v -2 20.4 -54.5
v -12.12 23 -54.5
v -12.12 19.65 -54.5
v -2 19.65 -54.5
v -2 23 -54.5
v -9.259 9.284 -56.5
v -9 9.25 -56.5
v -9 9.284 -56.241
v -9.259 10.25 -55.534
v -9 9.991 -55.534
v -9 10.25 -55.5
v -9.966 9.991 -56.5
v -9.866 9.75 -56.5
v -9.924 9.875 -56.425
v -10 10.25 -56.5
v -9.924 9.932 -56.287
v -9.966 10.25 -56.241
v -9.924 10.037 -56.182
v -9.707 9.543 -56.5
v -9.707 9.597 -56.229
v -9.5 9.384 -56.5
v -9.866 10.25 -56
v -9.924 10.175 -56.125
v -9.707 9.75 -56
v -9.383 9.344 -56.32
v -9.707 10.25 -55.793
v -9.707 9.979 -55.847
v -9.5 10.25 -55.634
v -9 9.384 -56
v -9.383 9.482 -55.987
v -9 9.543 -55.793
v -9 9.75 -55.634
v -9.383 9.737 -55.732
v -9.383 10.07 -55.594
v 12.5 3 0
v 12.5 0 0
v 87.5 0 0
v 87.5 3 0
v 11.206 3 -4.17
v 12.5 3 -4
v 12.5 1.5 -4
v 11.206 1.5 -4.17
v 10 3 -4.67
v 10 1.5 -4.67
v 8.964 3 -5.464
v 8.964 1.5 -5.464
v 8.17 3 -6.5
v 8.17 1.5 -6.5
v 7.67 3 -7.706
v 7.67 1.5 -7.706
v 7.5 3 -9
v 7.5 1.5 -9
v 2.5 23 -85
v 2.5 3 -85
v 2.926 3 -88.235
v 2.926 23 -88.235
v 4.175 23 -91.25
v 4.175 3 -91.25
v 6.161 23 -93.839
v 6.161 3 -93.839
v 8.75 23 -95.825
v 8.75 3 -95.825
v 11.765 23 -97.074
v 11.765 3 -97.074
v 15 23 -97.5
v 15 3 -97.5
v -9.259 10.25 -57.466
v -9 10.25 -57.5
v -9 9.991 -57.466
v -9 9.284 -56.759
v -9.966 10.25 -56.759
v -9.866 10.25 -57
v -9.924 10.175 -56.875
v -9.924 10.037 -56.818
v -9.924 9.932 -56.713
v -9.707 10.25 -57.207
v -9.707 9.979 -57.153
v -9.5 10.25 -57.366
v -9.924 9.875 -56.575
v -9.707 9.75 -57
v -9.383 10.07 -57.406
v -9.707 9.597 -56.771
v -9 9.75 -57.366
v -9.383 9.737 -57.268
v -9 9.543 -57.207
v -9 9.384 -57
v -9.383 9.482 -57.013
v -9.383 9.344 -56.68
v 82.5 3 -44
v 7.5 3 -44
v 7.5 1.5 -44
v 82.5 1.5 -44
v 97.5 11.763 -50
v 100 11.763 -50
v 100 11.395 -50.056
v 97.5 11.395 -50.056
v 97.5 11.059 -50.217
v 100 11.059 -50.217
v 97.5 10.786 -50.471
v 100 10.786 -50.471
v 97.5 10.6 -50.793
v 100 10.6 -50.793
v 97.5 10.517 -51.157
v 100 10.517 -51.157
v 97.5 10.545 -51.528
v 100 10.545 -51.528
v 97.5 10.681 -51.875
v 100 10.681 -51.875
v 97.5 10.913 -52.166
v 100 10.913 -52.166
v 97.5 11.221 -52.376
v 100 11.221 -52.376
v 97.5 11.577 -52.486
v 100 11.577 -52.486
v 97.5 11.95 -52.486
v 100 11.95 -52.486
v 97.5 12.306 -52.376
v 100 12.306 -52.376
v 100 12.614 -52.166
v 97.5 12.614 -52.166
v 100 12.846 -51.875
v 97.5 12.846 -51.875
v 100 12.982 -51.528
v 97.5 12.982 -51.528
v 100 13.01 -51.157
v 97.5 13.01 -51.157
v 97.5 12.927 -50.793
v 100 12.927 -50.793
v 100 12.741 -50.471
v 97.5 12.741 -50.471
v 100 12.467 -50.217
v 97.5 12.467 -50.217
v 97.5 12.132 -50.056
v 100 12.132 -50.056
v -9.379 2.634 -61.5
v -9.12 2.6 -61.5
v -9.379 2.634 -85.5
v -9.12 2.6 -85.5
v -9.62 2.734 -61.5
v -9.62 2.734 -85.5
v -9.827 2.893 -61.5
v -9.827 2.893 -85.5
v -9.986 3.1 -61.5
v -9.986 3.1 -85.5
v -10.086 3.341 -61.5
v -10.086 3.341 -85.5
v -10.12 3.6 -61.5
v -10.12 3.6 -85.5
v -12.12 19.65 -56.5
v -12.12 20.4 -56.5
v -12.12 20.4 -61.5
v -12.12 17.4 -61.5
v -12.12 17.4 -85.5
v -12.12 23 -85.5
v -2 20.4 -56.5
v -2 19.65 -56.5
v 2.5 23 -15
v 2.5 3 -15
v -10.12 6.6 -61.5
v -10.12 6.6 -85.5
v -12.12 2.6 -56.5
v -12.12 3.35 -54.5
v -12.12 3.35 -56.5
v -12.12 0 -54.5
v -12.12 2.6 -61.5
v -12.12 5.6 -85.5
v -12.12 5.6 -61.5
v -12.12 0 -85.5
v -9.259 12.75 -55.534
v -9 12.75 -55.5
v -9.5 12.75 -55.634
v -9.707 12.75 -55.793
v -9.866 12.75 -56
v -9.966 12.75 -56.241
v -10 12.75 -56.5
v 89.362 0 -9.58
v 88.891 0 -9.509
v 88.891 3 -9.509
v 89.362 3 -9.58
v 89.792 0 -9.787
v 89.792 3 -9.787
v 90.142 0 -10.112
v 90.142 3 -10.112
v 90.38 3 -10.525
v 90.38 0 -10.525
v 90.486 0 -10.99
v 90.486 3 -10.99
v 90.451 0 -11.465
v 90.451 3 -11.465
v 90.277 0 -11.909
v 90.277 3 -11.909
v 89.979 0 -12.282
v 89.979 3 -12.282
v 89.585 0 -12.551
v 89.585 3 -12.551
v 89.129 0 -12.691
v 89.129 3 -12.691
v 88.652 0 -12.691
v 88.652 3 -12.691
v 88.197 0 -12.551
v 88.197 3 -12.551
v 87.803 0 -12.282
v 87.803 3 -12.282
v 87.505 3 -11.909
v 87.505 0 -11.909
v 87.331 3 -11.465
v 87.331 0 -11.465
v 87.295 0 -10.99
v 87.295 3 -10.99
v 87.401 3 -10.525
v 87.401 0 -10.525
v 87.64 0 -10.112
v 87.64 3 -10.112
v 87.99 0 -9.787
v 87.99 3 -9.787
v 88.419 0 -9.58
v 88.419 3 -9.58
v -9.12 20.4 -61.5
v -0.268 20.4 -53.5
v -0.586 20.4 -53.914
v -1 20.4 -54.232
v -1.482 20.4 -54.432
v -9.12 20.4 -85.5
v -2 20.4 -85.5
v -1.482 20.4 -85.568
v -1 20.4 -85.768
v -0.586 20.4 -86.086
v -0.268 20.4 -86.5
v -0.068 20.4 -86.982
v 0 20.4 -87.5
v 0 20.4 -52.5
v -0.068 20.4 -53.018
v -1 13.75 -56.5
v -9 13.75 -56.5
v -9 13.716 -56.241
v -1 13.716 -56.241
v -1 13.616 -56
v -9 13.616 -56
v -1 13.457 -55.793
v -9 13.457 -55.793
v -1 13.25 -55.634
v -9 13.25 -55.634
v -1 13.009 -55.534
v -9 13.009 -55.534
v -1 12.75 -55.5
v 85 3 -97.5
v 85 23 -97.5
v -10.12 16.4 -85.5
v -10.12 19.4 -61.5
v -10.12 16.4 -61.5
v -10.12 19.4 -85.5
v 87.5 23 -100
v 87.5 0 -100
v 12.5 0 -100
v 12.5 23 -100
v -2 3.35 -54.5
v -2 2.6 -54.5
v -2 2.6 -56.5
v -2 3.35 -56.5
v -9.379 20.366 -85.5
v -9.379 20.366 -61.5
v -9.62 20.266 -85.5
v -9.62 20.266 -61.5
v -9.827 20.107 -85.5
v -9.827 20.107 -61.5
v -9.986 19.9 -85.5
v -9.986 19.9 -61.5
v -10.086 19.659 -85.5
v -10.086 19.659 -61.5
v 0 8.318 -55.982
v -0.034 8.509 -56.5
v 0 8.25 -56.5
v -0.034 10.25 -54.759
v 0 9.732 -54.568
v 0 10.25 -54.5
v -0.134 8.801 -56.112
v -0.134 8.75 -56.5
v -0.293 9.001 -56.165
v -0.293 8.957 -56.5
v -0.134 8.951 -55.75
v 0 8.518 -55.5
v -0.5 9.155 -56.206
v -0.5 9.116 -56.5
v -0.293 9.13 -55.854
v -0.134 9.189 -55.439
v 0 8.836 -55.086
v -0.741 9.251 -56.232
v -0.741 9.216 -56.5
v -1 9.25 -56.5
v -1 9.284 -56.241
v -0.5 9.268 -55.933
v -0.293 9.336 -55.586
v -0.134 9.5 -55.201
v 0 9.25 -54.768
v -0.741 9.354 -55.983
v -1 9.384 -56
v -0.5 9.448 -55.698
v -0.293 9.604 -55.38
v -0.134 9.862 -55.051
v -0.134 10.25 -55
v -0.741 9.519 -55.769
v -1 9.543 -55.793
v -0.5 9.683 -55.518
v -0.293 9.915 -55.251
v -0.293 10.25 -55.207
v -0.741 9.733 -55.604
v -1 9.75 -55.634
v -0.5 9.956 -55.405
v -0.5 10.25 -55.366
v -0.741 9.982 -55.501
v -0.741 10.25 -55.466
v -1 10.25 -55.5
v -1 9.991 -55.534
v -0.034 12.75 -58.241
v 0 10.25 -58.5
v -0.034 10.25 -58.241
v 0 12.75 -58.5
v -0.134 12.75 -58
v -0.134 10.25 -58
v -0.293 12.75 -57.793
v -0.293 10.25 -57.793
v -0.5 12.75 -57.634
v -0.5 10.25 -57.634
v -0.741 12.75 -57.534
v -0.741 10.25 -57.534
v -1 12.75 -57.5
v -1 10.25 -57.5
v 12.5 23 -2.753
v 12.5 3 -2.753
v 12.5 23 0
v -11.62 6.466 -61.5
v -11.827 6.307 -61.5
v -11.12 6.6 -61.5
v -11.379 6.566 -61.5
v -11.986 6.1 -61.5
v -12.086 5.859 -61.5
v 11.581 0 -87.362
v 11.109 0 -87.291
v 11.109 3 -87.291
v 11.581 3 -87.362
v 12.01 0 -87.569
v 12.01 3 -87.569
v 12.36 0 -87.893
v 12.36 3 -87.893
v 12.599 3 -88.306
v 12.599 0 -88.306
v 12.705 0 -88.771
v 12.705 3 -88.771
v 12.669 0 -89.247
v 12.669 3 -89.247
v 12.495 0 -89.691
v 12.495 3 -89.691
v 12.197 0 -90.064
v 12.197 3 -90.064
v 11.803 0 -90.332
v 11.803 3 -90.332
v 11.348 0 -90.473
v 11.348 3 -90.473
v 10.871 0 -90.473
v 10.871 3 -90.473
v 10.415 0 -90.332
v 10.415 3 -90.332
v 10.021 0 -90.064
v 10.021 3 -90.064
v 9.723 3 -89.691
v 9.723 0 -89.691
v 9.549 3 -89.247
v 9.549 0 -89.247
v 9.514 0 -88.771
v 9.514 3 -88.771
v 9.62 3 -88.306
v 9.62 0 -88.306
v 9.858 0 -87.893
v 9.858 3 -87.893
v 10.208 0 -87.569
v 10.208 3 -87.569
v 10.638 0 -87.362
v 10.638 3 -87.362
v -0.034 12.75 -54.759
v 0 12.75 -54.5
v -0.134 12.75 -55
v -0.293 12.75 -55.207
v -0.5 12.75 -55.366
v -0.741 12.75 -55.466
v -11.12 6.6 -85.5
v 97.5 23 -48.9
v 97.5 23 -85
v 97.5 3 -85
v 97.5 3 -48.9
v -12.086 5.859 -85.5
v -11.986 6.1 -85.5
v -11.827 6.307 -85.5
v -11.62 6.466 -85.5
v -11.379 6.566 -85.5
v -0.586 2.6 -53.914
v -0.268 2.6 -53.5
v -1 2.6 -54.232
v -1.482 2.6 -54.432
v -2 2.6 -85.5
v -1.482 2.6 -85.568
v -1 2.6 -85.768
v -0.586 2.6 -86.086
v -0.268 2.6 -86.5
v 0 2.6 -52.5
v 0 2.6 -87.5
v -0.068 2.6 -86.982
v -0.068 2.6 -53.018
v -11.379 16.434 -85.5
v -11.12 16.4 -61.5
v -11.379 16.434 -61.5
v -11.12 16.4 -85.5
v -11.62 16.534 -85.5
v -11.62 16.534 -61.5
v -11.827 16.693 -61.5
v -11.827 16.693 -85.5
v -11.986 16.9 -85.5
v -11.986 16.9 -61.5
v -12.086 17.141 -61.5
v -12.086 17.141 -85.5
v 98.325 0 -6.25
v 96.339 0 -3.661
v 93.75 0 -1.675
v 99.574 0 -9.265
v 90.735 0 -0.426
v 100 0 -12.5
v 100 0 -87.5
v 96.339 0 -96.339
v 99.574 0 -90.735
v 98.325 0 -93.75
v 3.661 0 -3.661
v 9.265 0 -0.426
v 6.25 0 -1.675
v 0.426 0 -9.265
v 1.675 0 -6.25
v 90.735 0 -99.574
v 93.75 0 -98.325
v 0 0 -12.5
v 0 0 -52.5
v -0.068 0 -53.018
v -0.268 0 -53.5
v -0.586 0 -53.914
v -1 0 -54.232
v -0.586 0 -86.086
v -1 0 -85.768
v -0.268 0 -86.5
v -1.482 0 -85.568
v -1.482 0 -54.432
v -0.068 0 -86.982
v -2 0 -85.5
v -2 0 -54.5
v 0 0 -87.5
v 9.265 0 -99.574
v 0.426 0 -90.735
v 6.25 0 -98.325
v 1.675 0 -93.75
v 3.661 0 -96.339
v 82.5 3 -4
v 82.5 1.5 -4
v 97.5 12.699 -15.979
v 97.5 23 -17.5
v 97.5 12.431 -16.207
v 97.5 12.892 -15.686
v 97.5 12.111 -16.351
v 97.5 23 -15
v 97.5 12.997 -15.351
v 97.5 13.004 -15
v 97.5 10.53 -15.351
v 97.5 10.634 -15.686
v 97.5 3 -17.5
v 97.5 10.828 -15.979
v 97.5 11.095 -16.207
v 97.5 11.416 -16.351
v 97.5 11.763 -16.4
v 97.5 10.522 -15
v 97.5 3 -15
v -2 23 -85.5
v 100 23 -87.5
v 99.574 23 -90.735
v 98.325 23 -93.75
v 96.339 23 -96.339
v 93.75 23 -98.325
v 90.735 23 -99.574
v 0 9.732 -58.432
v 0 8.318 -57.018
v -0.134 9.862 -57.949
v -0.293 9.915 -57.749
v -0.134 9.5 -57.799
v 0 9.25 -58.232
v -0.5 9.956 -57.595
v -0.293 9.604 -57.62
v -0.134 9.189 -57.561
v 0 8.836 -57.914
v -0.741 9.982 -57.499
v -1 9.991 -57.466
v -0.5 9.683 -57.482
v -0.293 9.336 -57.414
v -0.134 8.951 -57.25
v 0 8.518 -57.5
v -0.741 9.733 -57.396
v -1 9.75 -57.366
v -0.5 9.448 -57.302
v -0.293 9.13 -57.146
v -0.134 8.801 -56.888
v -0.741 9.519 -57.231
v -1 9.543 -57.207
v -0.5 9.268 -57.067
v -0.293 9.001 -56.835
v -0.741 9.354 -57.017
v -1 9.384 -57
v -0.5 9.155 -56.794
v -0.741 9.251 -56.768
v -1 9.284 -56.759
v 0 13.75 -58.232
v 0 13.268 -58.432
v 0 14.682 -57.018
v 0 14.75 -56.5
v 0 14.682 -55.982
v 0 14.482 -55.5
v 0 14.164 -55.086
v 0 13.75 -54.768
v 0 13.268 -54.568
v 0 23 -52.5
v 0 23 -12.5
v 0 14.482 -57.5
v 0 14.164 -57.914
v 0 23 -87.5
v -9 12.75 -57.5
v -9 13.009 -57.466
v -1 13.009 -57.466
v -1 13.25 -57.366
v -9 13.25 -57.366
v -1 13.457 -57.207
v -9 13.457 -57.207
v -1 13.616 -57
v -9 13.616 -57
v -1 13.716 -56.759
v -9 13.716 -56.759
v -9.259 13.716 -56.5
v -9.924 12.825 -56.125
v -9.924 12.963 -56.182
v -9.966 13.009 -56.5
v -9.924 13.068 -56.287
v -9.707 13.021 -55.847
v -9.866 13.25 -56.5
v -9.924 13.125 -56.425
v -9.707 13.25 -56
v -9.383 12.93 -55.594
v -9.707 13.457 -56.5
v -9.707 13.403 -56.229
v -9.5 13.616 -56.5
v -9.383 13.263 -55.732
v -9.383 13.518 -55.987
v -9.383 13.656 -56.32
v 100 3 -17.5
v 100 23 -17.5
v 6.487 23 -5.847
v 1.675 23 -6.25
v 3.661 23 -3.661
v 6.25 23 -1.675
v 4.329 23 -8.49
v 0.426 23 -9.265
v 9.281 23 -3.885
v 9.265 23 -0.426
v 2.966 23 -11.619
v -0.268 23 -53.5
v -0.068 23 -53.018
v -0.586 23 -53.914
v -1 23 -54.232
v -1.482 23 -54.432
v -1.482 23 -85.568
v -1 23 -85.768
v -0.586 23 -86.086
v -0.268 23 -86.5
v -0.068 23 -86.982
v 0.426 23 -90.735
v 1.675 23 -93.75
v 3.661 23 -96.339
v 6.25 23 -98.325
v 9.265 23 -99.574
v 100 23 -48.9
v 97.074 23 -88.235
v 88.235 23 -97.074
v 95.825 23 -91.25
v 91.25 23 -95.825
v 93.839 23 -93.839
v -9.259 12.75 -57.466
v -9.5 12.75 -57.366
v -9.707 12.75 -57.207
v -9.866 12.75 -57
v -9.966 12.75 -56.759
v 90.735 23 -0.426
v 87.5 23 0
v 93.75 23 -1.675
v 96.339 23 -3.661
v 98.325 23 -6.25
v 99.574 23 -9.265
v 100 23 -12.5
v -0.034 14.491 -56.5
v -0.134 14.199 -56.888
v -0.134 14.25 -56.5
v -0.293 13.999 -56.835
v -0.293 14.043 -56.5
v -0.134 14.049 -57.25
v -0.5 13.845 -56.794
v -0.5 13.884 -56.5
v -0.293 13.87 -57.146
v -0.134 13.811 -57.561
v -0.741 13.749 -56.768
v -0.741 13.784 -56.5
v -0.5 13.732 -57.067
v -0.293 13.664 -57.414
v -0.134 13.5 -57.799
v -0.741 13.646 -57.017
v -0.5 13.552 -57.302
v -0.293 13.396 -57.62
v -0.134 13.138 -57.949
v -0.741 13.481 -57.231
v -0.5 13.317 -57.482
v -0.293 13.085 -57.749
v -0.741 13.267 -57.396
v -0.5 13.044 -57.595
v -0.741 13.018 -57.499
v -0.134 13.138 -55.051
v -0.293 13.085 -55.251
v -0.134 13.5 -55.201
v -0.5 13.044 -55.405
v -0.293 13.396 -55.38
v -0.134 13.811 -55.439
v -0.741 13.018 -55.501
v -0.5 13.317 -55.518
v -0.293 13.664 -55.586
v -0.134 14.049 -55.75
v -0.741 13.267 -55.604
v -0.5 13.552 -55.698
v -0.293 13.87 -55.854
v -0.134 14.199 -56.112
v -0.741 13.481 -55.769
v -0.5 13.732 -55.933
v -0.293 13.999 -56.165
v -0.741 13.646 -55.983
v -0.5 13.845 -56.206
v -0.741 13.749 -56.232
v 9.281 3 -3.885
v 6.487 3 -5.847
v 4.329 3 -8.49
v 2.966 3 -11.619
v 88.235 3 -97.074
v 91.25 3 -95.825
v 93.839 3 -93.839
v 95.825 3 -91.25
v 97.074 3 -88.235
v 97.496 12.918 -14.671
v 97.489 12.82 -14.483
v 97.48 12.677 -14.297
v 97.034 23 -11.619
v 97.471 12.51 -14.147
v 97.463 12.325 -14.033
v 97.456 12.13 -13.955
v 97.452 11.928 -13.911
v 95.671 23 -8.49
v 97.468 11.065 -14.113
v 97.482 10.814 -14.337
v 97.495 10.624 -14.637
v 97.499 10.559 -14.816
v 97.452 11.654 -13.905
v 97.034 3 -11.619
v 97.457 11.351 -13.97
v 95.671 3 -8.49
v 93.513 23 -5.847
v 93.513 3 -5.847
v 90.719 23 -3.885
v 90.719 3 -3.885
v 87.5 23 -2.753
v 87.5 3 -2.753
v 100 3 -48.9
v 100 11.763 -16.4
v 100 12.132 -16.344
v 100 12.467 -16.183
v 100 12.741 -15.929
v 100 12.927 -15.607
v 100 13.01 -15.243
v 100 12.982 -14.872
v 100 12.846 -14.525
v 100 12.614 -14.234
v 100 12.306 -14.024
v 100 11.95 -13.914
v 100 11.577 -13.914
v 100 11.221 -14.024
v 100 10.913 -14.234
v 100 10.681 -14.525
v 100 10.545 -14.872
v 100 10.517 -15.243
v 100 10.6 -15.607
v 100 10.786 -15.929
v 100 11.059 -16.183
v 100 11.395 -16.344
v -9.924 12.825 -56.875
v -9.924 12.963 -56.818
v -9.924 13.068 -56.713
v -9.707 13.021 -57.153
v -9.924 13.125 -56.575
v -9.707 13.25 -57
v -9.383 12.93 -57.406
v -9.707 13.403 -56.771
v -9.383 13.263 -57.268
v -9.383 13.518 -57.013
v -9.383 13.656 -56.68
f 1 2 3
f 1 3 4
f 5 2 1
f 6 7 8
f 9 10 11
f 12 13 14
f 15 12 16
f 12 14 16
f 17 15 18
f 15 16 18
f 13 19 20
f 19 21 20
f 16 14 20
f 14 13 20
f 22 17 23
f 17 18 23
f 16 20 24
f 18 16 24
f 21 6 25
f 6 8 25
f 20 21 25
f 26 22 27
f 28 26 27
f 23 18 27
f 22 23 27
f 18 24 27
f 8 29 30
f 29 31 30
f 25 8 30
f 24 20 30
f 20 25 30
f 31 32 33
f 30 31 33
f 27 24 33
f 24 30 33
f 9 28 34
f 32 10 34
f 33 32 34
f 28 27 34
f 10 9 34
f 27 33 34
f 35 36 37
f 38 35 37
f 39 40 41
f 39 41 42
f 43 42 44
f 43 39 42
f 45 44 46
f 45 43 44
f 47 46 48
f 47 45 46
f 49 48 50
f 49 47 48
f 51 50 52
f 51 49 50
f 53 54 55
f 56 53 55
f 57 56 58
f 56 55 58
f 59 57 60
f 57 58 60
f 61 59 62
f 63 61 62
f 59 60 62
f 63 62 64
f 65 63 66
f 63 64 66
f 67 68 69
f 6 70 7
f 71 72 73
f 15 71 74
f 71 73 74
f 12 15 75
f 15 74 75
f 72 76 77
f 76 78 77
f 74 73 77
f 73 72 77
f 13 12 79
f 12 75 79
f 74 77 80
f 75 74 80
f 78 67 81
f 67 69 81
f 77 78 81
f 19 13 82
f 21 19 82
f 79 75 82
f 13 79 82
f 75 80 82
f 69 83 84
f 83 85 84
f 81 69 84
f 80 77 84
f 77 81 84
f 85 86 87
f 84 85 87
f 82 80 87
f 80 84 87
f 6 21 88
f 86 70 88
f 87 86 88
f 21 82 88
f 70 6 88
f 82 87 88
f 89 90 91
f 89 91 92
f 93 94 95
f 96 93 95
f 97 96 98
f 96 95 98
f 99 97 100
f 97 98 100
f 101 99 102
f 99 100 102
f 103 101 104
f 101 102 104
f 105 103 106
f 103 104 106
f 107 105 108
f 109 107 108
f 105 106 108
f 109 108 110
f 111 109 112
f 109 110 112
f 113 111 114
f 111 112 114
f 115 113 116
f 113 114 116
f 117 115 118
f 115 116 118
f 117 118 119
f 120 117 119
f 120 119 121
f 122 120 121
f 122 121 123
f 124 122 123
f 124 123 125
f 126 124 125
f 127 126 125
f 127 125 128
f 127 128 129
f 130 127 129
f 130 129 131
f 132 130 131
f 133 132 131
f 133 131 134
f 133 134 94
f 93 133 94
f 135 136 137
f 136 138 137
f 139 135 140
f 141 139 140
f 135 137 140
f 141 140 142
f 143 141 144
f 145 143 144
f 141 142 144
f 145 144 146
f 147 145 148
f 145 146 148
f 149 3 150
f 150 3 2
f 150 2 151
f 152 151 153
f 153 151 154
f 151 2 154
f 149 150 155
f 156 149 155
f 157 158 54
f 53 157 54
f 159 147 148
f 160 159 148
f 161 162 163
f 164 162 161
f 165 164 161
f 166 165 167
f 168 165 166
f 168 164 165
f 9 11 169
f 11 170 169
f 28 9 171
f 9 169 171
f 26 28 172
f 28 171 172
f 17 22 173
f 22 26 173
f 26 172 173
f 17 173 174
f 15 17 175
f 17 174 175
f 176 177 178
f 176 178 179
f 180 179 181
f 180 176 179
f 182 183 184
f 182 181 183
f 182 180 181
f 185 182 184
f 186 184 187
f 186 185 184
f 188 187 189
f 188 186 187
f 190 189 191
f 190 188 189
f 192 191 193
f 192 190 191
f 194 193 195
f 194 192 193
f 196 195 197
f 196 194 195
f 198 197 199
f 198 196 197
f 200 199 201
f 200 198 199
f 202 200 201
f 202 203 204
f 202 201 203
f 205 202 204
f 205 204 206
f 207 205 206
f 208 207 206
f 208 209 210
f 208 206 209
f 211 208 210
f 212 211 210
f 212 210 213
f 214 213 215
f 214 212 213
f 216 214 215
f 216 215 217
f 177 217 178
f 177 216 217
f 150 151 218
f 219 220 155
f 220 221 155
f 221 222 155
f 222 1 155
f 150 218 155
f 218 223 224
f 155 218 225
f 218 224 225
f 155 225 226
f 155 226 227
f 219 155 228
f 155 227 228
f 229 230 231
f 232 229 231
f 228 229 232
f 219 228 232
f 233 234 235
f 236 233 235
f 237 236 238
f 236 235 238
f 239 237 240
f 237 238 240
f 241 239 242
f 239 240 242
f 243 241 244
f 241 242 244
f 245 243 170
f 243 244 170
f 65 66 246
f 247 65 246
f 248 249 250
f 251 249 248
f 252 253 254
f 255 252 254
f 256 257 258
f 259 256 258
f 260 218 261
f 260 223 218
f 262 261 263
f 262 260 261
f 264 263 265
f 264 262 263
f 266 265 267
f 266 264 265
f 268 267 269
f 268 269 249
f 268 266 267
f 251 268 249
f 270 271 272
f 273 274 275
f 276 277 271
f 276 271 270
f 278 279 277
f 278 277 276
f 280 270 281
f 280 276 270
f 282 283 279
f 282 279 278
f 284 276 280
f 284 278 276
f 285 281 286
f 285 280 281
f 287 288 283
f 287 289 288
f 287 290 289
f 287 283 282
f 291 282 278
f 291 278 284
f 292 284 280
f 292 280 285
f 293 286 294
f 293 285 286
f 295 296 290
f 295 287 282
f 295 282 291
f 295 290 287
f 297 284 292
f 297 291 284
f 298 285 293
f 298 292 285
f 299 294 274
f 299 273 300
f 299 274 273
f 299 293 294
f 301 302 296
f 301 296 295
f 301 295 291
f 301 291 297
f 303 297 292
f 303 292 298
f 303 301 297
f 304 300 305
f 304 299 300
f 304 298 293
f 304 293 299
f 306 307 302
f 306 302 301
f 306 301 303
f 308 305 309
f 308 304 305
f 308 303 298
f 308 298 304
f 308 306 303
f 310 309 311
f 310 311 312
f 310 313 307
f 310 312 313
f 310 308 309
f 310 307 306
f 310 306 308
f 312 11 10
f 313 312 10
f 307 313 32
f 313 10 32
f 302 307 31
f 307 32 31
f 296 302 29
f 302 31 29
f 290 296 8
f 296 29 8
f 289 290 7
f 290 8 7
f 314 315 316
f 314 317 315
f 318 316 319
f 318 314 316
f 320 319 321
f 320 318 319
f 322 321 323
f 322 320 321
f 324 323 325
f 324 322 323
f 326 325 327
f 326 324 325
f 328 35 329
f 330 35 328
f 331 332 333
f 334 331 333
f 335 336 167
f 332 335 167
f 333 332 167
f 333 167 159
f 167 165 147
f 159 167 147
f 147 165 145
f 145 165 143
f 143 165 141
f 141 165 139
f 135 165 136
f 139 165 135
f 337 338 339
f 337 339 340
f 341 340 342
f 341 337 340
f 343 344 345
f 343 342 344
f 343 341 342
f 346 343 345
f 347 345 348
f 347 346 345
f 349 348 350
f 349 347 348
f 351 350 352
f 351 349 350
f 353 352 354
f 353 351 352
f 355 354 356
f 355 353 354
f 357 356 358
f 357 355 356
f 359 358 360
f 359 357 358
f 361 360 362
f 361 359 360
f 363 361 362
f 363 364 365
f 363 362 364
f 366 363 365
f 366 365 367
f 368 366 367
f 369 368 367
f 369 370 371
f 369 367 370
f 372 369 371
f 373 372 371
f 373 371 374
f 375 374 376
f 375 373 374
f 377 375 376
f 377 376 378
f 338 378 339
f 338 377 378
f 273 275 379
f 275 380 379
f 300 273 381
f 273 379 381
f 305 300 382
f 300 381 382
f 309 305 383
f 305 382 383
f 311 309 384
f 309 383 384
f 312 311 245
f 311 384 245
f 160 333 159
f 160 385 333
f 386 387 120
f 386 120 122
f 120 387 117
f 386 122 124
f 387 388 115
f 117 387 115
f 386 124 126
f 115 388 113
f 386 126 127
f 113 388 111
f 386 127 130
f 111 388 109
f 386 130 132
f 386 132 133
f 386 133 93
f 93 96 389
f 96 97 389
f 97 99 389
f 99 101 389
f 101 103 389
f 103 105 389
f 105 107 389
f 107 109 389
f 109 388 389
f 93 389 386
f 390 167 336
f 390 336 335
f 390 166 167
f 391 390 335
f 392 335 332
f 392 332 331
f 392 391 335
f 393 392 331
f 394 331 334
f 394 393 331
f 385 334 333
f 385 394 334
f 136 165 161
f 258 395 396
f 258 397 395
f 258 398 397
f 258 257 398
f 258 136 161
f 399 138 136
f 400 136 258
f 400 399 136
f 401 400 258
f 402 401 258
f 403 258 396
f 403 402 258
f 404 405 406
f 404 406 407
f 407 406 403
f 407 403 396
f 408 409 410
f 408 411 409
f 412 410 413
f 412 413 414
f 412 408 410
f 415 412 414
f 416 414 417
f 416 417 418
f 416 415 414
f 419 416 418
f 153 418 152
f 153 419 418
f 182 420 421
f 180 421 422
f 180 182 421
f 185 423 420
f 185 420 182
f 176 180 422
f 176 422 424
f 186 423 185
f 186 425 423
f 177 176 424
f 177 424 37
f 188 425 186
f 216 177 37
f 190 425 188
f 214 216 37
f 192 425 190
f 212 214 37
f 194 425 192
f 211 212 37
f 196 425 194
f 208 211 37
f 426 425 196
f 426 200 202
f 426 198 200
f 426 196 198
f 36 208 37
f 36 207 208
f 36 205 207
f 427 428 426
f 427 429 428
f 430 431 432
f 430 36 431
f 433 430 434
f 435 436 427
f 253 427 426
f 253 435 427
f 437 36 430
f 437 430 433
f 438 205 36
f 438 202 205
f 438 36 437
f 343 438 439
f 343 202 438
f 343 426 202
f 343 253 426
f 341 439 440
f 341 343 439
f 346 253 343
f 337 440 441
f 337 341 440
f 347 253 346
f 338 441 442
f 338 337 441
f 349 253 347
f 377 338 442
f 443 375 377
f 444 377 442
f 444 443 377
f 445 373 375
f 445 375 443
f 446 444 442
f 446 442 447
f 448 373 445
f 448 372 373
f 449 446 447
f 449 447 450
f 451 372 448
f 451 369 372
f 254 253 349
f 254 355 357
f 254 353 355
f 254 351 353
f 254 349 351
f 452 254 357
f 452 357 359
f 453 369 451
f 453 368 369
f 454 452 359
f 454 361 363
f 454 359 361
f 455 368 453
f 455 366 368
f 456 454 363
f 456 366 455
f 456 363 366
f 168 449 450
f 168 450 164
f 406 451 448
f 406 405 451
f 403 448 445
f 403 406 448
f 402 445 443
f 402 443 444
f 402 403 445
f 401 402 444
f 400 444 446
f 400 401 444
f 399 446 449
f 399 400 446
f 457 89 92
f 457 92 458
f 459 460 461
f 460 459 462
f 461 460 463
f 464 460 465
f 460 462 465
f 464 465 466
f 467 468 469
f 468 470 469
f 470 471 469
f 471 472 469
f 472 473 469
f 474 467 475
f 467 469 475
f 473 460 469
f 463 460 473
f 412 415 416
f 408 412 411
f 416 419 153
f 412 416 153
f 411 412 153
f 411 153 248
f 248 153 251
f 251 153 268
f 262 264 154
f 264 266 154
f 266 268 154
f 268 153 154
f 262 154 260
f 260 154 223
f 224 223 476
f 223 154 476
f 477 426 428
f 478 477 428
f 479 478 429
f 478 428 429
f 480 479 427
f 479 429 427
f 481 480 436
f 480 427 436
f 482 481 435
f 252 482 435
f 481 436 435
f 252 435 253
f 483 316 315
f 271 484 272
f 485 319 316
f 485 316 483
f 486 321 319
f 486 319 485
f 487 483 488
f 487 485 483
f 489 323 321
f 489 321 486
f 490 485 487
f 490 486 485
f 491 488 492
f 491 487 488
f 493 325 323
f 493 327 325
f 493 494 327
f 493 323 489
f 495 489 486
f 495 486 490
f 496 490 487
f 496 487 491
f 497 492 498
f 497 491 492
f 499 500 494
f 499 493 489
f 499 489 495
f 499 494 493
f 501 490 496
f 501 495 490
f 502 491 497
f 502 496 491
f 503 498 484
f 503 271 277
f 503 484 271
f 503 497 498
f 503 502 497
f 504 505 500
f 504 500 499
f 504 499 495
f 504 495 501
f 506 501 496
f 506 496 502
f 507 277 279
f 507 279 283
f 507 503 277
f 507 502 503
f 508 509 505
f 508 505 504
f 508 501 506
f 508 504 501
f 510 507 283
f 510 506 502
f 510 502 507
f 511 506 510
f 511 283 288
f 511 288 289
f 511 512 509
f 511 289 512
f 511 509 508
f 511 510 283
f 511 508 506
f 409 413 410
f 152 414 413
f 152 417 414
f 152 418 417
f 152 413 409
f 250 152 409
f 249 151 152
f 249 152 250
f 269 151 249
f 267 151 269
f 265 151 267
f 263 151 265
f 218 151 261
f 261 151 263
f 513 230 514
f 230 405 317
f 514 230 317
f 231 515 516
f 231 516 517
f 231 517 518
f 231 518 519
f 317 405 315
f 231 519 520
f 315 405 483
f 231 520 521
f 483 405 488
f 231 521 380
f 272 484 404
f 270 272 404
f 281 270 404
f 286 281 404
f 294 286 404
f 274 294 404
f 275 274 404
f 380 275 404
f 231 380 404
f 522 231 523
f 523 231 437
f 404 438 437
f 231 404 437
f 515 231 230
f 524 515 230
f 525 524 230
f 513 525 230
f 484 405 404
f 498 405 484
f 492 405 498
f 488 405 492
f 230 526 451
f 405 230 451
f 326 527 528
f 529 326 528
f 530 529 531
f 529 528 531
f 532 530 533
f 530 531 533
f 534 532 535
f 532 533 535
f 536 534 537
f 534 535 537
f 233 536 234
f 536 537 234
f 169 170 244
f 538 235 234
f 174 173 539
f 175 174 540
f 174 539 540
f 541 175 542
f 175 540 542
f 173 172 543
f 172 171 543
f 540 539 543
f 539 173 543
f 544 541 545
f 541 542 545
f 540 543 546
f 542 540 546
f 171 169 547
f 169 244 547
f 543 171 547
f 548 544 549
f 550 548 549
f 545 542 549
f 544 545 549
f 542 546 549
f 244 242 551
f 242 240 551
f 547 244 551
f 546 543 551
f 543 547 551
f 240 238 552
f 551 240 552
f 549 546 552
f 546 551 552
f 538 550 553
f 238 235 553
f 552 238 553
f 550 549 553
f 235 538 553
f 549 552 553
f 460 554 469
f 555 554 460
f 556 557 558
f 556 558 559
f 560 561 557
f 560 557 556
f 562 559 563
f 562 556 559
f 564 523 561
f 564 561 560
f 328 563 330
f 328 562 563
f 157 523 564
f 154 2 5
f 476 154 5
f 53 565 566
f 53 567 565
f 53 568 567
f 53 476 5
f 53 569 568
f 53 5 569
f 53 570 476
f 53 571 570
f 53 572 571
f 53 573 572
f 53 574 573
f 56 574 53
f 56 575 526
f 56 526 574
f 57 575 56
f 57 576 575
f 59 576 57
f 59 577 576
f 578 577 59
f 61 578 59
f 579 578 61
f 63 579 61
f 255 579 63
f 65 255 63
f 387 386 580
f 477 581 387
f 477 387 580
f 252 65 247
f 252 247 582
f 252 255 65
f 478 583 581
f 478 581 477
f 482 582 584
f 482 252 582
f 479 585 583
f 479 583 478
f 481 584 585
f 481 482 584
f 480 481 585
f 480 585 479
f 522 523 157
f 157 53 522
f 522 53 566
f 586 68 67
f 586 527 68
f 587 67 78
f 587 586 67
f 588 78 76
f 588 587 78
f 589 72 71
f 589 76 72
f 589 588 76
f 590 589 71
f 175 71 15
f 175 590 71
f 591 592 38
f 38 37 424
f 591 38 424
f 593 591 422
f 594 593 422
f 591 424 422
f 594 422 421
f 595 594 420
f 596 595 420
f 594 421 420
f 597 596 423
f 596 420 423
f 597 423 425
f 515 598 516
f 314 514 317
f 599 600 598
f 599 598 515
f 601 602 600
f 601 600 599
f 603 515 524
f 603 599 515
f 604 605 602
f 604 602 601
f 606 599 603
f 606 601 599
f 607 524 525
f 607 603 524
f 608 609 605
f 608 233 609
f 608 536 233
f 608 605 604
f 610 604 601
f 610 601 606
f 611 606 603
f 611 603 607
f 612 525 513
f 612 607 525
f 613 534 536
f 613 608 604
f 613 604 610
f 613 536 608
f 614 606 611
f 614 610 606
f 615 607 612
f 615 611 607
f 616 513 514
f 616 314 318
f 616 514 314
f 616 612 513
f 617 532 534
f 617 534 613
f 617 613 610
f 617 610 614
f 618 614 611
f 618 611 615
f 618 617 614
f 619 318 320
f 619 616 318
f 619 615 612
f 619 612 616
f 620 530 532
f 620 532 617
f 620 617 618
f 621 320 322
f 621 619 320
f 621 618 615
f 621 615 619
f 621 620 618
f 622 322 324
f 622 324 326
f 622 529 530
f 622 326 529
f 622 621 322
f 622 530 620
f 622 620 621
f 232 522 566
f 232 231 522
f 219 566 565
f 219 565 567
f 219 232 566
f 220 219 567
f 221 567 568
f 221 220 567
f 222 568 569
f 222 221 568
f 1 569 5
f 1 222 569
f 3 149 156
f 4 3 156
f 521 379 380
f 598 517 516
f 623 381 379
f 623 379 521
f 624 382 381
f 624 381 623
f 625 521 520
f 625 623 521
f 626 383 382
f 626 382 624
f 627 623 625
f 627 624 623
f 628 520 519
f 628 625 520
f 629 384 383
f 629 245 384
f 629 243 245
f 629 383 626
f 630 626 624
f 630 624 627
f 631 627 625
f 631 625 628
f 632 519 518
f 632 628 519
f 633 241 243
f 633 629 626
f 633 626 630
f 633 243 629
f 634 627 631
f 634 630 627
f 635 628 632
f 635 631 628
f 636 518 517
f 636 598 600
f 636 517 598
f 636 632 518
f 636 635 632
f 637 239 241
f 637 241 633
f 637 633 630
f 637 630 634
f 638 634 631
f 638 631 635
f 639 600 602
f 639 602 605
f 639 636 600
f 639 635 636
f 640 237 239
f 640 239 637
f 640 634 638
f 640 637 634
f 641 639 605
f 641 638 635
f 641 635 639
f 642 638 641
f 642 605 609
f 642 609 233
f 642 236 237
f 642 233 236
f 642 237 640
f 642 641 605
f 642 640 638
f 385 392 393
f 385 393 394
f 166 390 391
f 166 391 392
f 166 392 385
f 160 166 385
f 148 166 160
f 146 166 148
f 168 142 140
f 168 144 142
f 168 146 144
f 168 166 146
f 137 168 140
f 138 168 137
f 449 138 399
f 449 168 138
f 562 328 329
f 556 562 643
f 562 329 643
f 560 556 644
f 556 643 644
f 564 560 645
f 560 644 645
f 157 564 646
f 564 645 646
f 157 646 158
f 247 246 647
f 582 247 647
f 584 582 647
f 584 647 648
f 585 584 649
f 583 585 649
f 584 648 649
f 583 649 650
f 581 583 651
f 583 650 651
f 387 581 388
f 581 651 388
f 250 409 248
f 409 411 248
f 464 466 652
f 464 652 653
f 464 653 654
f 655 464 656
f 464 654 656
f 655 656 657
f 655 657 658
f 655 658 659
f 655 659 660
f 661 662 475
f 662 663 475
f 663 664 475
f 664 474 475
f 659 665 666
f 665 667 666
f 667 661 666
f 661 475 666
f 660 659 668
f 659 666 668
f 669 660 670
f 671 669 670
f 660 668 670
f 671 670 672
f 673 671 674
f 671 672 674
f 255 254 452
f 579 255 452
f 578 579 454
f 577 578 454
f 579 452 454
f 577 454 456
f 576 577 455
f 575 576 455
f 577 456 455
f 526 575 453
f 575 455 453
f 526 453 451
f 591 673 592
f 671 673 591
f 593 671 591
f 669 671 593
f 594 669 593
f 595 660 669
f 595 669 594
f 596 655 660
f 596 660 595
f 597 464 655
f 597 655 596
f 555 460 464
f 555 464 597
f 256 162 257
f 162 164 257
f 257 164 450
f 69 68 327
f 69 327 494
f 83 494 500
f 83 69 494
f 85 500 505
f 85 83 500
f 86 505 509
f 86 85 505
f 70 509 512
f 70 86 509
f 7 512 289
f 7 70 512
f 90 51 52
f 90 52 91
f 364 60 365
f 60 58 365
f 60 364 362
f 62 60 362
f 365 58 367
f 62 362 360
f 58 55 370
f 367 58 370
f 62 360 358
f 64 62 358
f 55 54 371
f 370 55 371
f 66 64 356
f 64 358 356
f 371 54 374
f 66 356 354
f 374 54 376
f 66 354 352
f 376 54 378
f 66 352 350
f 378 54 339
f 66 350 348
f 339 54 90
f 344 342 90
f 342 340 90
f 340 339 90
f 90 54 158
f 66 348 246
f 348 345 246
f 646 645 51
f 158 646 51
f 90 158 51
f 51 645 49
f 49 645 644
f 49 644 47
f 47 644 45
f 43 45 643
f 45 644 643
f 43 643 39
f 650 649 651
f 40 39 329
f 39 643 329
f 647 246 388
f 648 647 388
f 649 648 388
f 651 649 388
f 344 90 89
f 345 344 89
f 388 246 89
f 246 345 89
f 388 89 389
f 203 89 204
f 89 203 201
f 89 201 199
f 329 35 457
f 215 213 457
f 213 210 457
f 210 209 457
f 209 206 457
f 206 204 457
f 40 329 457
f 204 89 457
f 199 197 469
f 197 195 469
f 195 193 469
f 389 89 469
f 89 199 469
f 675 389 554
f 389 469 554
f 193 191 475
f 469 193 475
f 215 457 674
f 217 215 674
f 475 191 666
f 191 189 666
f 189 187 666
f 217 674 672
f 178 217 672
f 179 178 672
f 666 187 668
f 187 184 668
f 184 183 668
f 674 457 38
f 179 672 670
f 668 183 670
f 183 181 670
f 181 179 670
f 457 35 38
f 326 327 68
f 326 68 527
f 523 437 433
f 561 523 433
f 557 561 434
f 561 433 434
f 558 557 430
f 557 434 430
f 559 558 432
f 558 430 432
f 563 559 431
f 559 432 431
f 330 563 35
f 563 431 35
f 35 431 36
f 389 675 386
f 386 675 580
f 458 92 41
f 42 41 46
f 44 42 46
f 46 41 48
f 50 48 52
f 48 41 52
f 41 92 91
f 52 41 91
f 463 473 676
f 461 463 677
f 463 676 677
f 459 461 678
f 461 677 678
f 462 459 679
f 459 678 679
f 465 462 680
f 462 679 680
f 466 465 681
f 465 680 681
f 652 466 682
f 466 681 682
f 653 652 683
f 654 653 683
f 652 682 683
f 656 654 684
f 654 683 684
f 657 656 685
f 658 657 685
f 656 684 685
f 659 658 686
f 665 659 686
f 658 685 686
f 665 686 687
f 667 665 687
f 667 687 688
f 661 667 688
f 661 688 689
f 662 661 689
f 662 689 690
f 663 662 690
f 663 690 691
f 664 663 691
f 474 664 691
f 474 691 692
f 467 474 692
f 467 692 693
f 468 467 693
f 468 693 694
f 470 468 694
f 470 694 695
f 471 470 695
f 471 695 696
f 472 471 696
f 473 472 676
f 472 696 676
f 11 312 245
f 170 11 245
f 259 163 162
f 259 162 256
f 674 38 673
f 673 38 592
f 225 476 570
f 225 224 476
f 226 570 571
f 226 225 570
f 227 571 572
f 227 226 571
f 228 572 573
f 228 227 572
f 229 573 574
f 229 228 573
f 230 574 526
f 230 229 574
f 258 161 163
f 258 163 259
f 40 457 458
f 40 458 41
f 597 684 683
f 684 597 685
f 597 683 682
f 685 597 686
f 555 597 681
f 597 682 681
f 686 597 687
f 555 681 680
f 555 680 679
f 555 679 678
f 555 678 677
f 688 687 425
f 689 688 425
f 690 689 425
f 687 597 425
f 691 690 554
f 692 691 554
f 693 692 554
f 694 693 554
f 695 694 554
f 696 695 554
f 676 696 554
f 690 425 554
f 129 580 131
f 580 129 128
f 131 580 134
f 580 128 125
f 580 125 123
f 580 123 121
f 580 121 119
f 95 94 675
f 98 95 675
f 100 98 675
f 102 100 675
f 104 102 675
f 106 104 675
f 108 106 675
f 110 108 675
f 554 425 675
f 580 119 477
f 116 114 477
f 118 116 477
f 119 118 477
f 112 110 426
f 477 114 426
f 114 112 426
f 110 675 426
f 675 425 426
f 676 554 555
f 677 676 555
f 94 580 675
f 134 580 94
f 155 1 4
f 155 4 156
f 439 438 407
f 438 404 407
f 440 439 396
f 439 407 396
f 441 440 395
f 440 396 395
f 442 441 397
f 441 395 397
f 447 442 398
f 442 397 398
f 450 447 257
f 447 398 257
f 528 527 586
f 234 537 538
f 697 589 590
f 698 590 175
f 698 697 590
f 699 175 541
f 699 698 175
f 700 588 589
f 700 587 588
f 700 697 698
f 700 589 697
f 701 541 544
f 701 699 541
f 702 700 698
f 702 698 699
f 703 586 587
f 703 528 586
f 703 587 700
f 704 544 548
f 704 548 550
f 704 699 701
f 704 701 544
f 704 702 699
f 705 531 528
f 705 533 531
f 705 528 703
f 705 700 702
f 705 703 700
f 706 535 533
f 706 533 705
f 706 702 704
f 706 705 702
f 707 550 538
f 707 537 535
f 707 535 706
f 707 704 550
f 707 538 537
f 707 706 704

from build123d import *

# Parameters (mm, degrees)
BOSS_EXTRUDE1_DEPTH     = 23
BOSS_EXTRUDE2_DEPTH     = 3
CUT_EXTRUDE1_DEPTH      = 143.828568571
CUT_EXTRUDE1_DEPTH_BACK = 143.828568571
SKETCH4_R               = 1.6
CUT_EXTRUDE2_DEPTH      = 1.5
SKETCH6_W               = 75
SKETCH6_H               = 20
CUT_EXTRUDE4_DEPTH      = 5
SKETCH8_R               = 1.25
SKETCH8_W               = 31.4
SKETCH8_H               = 20
CUT_EXTRUDE5_DEPTH      = 5
SKETCH9_W               = 2
SKETCH9_H               = 4.5
BOSS_EXTRUDE3_DEPTH     = 10
FILLET2_R               = 1
SKETCH10_W              = 12.12
SKETCH10_H              = 31
BOSS_EXTRUDE4_DEPTH     = 2.6
FILLET3_R               = 2
FILLET5_R               = 2
SKETCH11_W              = 2
SKETCH11_H              = 24
BOSS_EXTRUDE5_DEPTH     = 4
FILLET6_R               = 1
FILLET7_R               = 1
SKETCH12_W              = 10.12
SKETCH12_H              = 2
BOSS_EXTRUDE6_DEPTH     = 0.75
FILLET3_OF_MIRROR1_R    = 2
FILLET5_OF_MIRROR1_R    = 2
FILLET6_OF_MIRROR1_R    = 1
FILLET7_OF_MIRROR1_R    = 1


with BuildPart() as part:
    # Sketch1 → Boss-Extrude1 (new body)
    with BuildSketch(Plane(origin=(0, 0, 0), x_dir=(1, 0, 0), z_dir=(0, 1, 0))):
        with BuildLine():
            Line((12.5, 0), (87.5, 0))
            ThreePointArc((87.5, 0), (96.338834765, 3.661165235), (100, 12.5))
            Line((100, 12.5), (100, 87.5))
            ThreePointArc((100, 87.5), (96.338834765, 96.338834765), (87.5, 100))
            Line((87.5, 100), (12.5, 100))
            ThreePointArc((12.5, 100), (3.661165235, 96.338834765), (0, 87.5))
            Line((0, 87.5), (0, 12.5))
            ThreePointArc((0, 12.5), (3.661165235, 3.661165235), (12.5, 0))
        make_face()
        with BuildLine():
            Line((15, 97.5), (85, 97.5))
            ThreePointArc((85, 97.5), (93.838834765, 93.838834765), (97.5, 85))
            Line((97.5, 85), (97.5, 15))
            ThreePointArc((97.5, 15), (93.838834765, 6.161165235), (85, 2.5))
            Line((85, 2.5), (15, 2.5))
            ThreePointArc((15, 2.5), (6.161165235, 6.161165235), (2.5, 15))
            Line((2.5, 15), (2.5, 85))
            ThreePointArc((2.5, 85), (6.161165235, 93.838834765), (15, 97.5))
        make_face(mode=Mode.SUBTRACT)
    extrude(amount=BOSS_EXTRUDE1_DEPTH)

    # Sketch1<2> → Boss-Extrude2 (add)
    with BuildSketch(Plane(origin=(0, 0, 0), x_dir=(1, 0, 0), z_dir=(0, 1, 0))):
        with BuildLine():
            Line((15, 97.5), (85, 97.5))
            ThreePointArc((85, 97.5), (93.838834765, 93.838834765), (97.5, 85))
            Line((97.5, 85), (97.5, 15))
            ThreePointArc((97.5, 15), (93.838834765, 6.161165235), (85, 2.5))
            Line((85, 2.5), (15, 2.5))
            ThreePointArc((15, 2.5), (6.161165235, 6.161165235), (2.5, 15))
            Line((2.5, 15), (2.5, 85))
            ThreePointArc((2.5, 85), (6.161165235, 93.838834765), (15, 97.5))
        make_face()
    extrude(amount=BOSS_EXTRUDE2_DEPTH)

    # Sketch4 → Cut-Extrude1 (cut, two sides: drawn at the far end of the back side and taken through both)
    with BuildSketch(Plane(origin=(0, 3, 0), x_dir=(1, 0, 0), z_dir=(0, 1, 0)).offset(-CUT_EXTRUDE1_DEPTH_BACK)):
        with Locations(Location((88.890872965, 11.109127035, 0), (0, 0, 270))):
            Circle(SKETCH4_R)
        with Locations(Location((11.109127035, 88.890872965, 0), (0, 0, 270))):
            Circle(SKETCH4_R)
    extrude(amount=CUT_EXTRUDE1_DEPTH + CUT_EXTRUDE1_DEPTH_BACK, mode=Mode.SUBTRACT)

    # Sketch5 → Cut-Extrude2 (cut)
    with BuildSketch(Plane(origin=(0, 3, 0), x_dir=(1, 0, 0), z_dir=(0, 1, 0))):
        with BuildLine():
            Line((82.5, 4), (12.5, 4))
            ThreePointArc((12.5, 4), (8.964466094, 5.464466094), (7.5, 9))
            Line((7.5, 9), (7.5, 44))
            Line((7.5, 44), (82.5, 44))
            Line((82.5, 44), (82.5, 4))
        make_face()
    extrude(amount=-CUT_EXTRUDE2_DEPTH, mode=Mode.SUBTRACT)

    # Sketch6 → Cut-Extrude4 (cut)
    with BuildSketch(Plane.XY):
        with Locations((50, 13)):
            Rectangle(SKETCH6_W, SKETCH6_H)
    extrude(amount=-CUT_EXTRUDE4_DEPTH, mode=Mode.SUBTRACT)

    # Sketch8 → Cut-Extrude5 (cut)
    with BuildSketch(Plane(origin=(100, 0, 0), x_dir=(0, 0, -1), z_dir=(1, 0, 0))):
        with Locations((15.15, 11.76333723)):
            Circle(SKETCH8_R)
        with Locations(Location((51.25, 11.76333723, 0), (0, 0, 180))):
            Circle(SKETCH8_R)
        with Locations((33.2, 13)):
            Rectangle(SKETCH8_W, SKETCH8_H)
    extrude(amount=-CUT_EXTRUDE5_DEPTH, mode=Mode.SUBTRACT)

    # Sketch9 → Boss-Extrude3 (add)
    with BuildSketch(Plane.ZY):
        with Locations((-56.5, 11.5)):
            Rectangle(SKETCH9_W, SKETCH9_H)
    extrude(amount=BOSS_EXTRUDE3_DEPTH)

    # Fillet2
    fillet2_edges = [part.edges().sort_by_distance(p)[0] for p in [
        (0, 11.5, -57.5),
        (-5, 13.75, -57.5),
        (0, 9.25, -56.5),
        (-5, 9.25, -57.5),
        (0, 11.5, -55.5),
        (-5, 9.25, -55.5),
        (0, 13.75, -56.5),
        (-5, 13.75, -55.5),
        (-10, 11.5, -57.5),
        (-10, 9.25, -56.5),
        (-10, 11.5, -55.5),
        (-10, 13.75, -56.5),
    ]]
    fillet(fillet2_edges, radius=FILLET2_R - 0.0001)  # a hair under: the kernel refuses the full size

    # Sketch10 → Boss-Extrude4 (add)
    with BuildSketch(Plane(origin=(0, 0, 0), x_dir=(1, 0, 0), z_dir=(0, 1, 0))):
        with Locations((-6.06, 70)):
            Rectangle(SKETCH10_W, SKETCH10_H)
    boss_extrude4 = extrude(amount=BOSS_EXTRUDE4_DEPTH)

    # Fillet3
    fillet3_edges = [part.edges().sort_by_distance(p)[0] for p in [
        (0, 1.3, -54.5),
    ]]
    fillet(fillet3_edges, radius=FILLET3_R)

    # Fillet5
    fillet5_edges = [part.edges().sort_by_distance(p)[0] for p in [
        (0, 1.3, -85.5),
    ]]
    fillet(fillet5_edges, radius=FILLET5_R - 0.0001)  # a hair under: the kernel refuses the full size

    # Sketch11 → Boss-Extrude5 (add)
    with BuildSketch(Plane(origin=(0, 2.6, 0), x_dir=(1, 0, 0), z_dir=(0, 1, 0))):
        with Locations((-11.12, 73.5)):
            Rectangle(SKETCH11_W, SKETCH11_H)
    boss_extrude5 = extrude(amount=BOSS_EXTRUDE5_DEPTH)

    # Fillet6
    fillet6_edges = [part.edges().sort_by_distance(p)[0] for p in [
        (-12.12, 6.6, -73.5),
    ]]
    fillet(fillet6_edges, radius=FILLET6_R)

    # Fillet7
    fillet7_edges = [part.edges().sort_by_distance(p)[0] for p in [
        (-10.12, 2.6, -73.5),
    ]]
    fillet(fillet7_edges, radius=FILLET7_R)

    # Sketch12 → Boss-Extrude6 (add)
    with BuildSketch(Plane(origin=(0, 2.6, 0), x_dir=(1, 0, 0), z_dir=(0, 1, 0))):
        with Locations((-7.06, 55.5)):
            Rectangle(SKETCH12_W, SKETCH12_H)
    boss_extrude6 = extrude(amount=BOSS_EXTRUDE6_DEPTH)

    # Mirror1: Boss-Extrude4, Boss-Extrude5, Boss-Extrude6 across plane
    add(boss_extrude4.mirror(Plane.ZX.offset(11.5)))
    add(boss_extrude5.mirror(Plane.ZX.offset(11.5)))
    add(boss_extrude6.mirror(Plane.ZX.offset(11.5)))

    # Fillet3 of Mirror1
    fillet3_of_mirror1_edges = [part.edges().sort_by_distance(p)[0] for p in [
        (0, 21.7, -54.5),
    ]]
    fillet(fillet3_of_mirror1_edges, radius=FILLET3_OF_MIRROR1_R)

    # Fillet5 of Mirror1
    fillet5_of_mirror1_edges = [part.edges().sort_by_distance(p)[0] for p in [
        (0, 21.7, -85.5),
    ]]
    fillet(fillet5_of_mirror1_edges, radius=FILLET5_OF_MIRROR1_R - 0.0001)  # a hair under: the kernel refuses the full size

    # Fillet6 of Mirror1
    fillet6_of_mirror1_edges = [part.edges().sort_by_distance(p)[0] for p in [
        (-12.12, 16.4, -73.5),
    ]]
    fillet(fillet6_of_mirror1_edges, radius=FILLET6_OF_MIRROR1_R)

    # Fillet7 of Mirror1
    fillet7_of_mirror1_edges = [part.edges().sort_by_distance(p)[0] for p in [
        (-10.12, 20.4, -73.5),
    ]]
    fillet(fillet7_of_mirror1_edges, radius=FILLET7_OF_MIRROR1_R)


solid = part.part
